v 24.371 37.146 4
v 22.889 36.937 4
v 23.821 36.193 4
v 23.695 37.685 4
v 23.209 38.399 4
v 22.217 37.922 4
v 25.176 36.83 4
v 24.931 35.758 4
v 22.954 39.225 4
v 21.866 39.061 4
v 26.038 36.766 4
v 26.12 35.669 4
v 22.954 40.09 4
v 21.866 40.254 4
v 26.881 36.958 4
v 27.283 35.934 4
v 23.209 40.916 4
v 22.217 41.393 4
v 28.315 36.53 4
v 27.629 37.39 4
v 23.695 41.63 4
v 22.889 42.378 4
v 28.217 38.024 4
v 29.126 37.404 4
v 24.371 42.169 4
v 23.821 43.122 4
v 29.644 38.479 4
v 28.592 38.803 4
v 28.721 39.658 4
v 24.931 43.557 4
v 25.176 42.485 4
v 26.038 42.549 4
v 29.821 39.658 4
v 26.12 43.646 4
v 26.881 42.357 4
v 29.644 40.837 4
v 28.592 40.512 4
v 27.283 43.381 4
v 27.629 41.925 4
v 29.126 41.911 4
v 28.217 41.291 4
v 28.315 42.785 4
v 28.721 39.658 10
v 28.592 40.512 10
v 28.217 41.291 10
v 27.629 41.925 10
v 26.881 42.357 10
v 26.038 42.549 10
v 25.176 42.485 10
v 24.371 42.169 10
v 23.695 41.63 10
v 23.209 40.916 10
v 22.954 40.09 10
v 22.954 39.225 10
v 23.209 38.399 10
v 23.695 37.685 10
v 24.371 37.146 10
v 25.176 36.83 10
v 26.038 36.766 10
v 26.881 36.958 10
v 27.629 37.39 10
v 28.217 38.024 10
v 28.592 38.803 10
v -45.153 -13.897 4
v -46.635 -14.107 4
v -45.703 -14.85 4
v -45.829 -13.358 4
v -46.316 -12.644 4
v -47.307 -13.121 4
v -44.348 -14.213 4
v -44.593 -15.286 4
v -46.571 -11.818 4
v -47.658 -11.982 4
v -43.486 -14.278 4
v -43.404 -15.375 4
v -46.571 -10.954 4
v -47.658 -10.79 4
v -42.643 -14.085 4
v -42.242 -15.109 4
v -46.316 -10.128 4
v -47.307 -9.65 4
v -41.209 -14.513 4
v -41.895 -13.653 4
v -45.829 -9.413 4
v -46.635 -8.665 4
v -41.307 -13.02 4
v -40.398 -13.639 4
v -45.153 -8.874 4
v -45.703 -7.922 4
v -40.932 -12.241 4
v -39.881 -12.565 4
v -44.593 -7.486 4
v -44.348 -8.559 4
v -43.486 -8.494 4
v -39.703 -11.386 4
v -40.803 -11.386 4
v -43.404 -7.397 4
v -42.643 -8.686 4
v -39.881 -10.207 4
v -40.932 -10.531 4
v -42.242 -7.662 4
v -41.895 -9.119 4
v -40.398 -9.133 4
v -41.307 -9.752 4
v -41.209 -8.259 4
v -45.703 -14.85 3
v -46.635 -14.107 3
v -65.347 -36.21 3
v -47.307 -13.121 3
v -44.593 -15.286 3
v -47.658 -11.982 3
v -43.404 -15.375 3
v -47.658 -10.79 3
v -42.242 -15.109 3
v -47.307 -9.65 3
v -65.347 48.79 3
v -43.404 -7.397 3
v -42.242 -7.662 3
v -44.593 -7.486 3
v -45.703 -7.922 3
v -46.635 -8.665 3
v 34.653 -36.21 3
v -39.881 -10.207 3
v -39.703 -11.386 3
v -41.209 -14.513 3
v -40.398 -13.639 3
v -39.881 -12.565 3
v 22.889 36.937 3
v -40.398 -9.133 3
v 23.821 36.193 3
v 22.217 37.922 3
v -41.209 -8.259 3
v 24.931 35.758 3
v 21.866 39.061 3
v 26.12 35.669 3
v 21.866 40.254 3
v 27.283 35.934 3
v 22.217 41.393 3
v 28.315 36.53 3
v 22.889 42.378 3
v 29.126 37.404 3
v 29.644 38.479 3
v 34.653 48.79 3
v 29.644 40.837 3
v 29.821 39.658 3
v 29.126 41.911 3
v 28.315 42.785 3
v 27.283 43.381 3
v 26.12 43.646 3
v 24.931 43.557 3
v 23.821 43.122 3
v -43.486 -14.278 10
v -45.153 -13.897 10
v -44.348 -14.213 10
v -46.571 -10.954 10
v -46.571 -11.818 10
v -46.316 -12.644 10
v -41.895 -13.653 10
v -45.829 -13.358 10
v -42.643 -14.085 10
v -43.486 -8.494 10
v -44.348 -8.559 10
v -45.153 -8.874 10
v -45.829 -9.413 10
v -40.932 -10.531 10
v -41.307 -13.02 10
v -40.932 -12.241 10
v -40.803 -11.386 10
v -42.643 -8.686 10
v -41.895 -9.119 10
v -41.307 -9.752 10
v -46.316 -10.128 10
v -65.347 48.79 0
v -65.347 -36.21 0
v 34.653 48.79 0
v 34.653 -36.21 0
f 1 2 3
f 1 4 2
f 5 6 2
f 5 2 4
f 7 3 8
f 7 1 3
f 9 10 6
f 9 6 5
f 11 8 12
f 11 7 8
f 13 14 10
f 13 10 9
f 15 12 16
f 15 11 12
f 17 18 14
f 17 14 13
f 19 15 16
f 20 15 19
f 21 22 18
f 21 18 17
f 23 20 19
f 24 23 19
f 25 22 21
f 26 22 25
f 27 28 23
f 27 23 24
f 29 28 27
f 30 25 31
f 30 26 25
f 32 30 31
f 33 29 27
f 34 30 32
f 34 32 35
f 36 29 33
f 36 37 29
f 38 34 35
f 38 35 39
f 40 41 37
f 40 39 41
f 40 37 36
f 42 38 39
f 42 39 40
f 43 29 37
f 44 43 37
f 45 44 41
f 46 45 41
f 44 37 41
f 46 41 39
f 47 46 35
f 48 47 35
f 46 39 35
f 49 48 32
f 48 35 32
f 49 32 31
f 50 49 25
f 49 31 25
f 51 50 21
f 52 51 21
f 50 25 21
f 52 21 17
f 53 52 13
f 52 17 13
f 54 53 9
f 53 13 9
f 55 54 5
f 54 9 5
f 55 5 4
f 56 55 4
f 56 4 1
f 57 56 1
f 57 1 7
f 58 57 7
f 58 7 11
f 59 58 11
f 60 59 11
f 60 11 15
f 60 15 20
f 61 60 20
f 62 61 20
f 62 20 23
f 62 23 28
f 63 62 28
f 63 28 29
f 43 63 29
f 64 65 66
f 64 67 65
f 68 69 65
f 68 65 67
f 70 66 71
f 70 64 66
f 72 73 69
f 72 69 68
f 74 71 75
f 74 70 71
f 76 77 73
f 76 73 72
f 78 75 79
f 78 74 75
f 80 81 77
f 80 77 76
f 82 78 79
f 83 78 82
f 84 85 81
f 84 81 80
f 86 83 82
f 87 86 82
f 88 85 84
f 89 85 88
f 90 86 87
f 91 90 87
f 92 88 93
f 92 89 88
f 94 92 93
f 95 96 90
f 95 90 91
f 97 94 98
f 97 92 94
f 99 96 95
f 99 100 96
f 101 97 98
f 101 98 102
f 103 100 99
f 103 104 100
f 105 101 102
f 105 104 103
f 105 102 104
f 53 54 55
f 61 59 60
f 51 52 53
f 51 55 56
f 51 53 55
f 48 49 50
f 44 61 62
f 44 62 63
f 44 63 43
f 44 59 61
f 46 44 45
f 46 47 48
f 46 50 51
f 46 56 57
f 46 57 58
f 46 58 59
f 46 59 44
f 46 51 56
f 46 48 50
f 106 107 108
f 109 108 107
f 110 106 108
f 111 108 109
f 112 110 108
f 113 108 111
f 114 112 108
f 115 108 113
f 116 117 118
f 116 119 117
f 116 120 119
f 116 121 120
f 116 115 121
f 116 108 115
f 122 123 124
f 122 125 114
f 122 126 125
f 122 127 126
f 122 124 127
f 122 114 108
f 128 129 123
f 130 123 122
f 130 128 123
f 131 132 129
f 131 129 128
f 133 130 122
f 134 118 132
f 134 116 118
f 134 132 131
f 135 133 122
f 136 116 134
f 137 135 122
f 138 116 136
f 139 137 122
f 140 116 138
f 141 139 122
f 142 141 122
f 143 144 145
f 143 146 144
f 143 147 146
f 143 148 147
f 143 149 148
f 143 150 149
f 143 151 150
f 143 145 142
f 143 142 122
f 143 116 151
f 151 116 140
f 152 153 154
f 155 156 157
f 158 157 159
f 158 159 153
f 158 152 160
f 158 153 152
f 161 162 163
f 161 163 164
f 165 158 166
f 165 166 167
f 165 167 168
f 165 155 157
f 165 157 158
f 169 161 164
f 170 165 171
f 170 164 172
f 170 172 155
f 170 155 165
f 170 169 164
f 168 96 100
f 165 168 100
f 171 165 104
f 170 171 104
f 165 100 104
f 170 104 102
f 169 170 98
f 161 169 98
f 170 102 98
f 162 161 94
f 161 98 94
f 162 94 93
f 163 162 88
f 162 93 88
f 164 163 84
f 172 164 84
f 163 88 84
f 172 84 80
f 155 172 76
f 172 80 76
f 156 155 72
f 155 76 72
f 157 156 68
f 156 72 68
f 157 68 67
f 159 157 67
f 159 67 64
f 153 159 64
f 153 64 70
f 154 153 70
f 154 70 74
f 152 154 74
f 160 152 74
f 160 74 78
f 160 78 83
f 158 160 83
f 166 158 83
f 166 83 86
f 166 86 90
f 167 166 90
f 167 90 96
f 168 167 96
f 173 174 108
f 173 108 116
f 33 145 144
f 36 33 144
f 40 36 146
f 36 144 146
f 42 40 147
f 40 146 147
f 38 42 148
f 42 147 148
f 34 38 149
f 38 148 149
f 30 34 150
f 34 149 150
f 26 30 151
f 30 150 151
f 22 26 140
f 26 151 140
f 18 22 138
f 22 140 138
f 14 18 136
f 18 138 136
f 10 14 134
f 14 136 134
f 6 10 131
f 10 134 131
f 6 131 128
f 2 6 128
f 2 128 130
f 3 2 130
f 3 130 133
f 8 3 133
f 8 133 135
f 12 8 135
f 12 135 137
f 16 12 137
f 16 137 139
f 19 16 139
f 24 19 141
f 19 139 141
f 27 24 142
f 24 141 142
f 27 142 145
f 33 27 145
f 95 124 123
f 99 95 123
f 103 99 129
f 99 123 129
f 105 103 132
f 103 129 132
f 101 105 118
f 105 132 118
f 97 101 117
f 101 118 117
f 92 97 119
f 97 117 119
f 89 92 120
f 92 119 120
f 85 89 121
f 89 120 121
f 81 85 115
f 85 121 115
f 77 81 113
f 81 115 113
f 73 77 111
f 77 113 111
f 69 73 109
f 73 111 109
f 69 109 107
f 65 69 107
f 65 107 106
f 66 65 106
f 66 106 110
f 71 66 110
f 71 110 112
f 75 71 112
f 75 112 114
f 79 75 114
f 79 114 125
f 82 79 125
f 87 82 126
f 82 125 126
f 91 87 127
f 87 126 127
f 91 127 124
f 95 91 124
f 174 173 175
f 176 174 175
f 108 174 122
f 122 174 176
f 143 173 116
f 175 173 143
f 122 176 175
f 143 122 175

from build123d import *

# Parameters (mm, degrees)
F0_W     = 100
F0_H     = 85
F1_DEPTH = 3
F2_R     = 2.9
F3_DEPTH = 7
F2_R_2   = 4
F4_DEPTH = 1


with BuildPart() as f1:
    # F0 (on Top) → F1 (new body)
    with BuildSketch(Plane.XY):
        with Locations((-15.346884, 6.289634)):
            Rectangle(F0_W, F0_H)
    extrude(amount=F1_DEPTH)

    # F2 (on face) → F3 (join)
    with BuildSketch(Plane.XY.offset(3)):
        with Locations((-43.702953, -11.385884)):
            Circle(F2_R)
        with Locations((25.821336, 39.657585)):
            Circle(F2_R)
    extrude(amount=F3_DEPTH)

    # F2 (on face) → F4 (join)
    with BuildSketch(Plane.XY.offset(3)):
        with Locations((-43.702953, -11.385884)):
            Circle(F2_R_2)
        with Locations((-43.702953, -11.385884)):
            Circle(F2_R, mode=Mode.SUBTRACT)
        with Locations((25.821336, 39.657585)):
            Circle(F2_R_2)
        with Locations((25.821336, 39.657585)):
            Circle(F2_R, mode=Mode.SUBTRACT)
    extrude(amount=F4_DEPTH)


solid = f1.part
